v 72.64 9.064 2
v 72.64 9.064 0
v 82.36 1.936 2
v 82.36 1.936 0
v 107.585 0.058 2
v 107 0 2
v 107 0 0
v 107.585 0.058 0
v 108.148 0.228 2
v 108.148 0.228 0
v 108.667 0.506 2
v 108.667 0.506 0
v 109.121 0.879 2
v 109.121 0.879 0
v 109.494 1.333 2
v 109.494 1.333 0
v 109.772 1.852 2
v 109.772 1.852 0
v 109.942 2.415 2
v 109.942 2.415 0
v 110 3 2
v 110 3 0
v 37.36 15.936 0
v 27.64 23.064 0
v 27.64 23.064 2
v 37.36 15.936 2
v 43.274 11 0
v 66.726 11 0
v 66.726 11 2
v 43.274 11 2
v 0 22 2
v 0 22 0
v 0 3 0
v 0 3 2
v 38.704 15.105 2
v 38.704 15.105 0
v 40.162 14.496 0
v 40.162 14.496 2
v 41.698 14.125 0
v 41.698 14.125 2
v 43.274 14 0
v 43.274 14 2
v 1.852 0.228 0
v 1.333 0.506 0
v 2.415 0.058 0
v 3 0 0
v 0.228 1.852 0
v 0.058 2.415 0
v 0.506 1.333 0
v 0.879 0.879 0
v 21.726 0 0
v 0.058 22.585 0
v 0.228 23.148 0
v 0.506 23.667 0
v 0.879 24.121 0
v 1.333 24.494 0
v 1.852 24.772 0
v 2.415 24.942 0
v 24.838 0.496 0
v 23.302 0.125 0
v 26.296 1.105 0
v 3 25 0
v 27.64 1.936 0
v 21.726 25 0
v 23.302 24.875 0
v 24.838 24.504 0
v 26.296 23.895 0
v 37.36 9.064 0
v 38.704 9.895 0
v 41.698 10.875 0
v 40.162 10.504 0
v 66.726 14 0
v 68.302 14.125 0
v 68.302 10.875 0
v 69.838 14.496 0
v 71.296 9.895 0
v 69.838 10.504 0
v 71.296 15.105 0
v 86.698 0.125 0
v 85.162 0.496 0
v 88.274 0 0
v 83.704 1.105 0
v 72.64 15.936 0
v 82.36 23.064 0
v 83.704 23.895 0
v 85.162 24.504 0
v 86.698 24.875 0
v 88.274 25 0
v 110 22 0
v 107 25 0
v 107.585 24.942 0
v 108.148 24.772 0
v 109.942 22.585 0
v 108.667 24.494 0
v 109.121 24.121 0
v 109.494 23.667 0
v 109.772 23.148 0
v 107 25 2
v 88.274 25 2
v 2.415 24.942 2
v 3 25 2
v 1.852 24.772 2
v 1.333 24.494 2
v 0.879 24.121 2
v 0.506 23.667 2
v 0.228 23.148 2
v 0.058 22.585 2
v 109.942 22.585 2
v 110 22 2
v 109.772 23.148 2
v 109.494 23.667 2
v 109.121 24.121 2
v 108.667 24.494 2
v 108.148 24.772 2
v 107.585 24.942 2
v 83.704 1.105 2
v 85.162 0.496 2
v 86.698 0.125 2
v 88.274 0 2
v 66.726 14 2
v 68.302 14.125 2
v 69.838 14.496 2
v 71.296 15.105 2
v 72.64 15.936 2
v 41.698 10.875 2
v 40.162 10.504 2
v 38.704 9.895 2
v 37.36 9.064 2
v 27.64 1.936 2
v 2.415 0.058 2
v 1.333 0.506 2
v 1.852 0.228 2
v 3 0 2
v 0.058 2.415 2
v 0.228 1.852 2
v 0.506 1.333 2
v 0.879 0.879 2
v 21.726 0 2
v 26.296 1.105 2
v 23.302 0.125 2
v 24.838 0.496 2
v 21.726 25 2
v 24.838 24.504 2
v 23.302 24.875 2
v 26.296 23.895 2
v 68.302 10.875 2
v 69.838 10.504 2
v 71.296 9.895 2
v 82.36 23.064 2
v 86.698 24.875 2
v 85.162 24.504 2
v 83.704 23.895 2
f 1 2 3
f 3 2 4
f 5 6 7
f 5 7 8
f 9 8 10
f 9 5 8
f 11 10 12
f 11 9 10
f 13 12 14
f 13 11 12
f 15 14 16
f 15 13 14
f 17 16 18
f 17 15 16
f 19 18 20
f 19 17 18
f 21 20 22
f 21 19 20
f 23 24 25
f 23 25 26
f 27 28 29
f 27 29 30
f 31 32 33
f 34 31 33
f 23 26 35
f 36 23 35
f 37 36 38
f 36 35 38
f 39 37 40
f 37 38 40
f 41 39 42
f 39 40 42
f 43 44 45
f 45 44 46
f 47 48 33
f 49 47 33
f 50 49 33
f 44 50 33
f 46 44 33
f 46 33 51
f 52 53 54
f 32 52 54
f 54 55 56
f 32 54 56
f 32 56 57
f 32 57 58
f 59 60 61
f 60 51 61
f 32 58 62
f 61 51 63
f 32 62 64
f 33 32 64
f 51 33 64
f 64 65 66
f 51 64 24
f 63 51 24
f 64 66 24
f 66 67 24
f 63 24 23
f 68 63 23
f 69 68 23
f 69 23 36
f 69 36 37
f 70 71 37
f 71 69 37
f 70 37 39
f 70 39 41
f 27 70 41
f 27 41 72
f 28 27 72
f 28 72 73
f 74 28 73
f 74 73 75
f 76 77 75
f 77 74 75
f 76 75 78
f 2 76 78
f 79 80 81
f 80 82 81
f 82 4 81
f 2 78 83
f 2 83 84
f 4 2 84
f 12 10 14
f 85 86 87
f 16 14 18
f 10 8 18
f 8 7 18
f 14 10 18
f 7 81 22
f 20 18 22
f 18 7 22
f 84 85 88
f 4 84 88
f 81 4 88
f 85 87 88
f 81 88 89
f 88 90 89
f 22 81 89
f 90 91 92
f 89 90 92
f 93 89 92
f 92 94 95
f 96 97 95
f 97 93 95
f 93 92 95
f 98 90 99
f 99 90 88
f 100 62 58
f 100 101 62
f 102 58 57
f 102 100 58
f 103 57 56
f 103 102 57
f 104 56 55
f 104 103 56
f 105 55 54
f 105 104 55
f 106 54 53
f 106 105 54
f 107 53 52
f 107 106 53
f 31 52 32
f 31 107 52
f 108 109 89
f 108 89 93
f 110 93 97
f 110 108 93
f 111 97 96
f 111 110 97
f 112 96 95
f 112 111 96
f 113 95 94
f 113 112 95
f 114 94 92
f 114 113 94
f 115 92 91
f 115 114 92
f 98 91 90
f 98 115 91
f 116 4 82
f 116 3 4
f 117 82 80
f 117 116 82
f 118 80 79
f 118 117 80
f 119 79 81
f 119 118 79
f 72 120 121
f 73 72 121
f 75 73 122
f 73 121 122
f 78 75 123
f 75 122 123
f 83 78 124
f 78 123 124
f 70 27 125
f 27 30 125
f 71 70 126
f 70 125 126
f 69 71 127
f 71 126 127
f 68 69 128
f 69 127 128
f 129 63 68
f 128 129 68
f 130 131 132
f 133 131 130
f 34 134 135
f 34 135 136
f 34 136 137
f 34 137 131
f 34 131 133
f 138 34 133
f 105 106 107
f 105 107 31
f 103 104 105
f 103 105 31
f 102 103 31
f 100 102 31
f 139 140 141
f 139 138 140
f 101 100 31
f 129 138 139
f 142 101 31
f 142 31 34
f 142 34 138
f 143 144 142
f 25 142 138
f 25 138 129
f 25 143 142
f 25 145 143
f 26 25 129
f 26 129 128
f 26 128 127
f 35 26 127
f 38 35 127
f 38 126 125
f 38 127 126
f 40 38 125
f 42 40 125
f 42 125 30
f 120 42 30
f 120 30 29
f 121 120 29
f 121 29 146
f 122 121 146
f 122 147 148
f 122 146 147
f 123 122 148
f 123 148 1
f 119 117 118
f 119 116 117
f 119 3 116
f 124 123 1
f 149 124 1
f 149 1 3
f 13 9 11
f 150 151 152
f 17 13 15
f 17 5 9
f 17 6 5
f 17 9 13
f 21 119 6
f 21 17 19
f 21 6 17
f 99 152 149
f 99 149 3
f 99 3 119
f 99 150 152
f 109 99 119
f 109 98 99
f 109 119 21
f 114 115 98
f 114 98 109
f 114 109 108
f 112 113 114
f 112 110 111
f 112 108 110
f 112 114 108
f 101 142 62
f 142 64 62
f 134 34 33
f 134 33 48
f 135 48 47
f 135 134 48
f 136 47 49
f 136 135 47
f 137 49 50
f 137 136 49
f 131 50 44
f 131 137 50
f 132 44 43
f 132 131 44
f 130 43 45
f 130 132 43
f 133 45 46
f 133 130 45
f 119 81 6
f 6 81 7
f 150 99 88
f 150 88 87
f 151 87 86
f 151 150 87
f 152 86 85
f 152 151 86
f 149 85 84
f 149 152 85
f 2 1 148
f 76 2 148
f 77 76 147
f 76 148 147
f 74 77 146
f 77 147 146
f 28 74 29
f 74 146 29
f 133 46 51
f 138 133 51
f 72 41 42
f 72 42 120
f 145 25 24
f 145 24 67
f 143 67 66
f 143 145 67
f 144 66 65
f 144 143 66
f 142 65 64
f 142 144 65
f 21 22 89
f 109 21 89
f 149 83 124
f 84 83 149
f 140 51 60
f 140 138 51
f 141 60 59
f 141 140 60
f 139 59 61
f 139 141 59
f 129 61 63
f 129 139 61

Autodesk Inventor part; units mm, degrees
ref_plane "YZ Plane" through (0, 0, 0) normal (1, 0, 0) x (0, 1, 0)
ref_plane "XZ Plane" through (0, 0, 0) normal (0, 1, 0) x (-1, 0, 0)
ref_plane "XY Plane" through (0, 0, 0) normal (0, 0, 1) x (1, 0, 0)
sketch "Sketch1" plane through (0, 0, 0) normal (0, 0, 1) x (1, 0, 0)
  line L0 (0, 0) -> (25, 0)
  line L1 (25, 25) -> (0, 25)
  line L2 (0, 25) -> (0, 0)
  line L3 (40, 14) -> (70, 14)
  line L4 (70, 11) -> (40, 11)
  line L5 (85, 0) -> (110, 0)
  line L6 (110, 0) -> (110, 25)
  line L7 (110, 25) -> (85, 25)
  line L8 (25, 25) -> (40, 14)
  line L9 (25, 0) -> (40, 11)
  line L10 (70, 14) -> (85, 25)
  line L11 (70, 11) -> (85, 0)
  point P0 (45, 12.5)
  point P1 (25, 12.5)
  dimension "d0" = 25
  dimension "d1" = 25
  dimension "d5" = 25
  dimension "d6" = 110
  dimension "d12" = 3
  dimension "d13" = 1.5
  dimension "d14" = 30
extrude "Extrusion1" add sketch "Sketch1" along normal blind 2
fillet "Fillet1" radius 10 8 edges at (25, 25, 1) (40, 14, 1) (70, 14, 1) (85, 25, 1) (25, 0, 1) (40, 11, 1) (70, 11, 1) (85, 0, 1)
fillet "Fillet2" radius 3 4 edges at (0, 25, 1) (0, 0, 1) (110, 25, 1) (110, 0, 1)
properties part number "Tensile Test Specimen"
